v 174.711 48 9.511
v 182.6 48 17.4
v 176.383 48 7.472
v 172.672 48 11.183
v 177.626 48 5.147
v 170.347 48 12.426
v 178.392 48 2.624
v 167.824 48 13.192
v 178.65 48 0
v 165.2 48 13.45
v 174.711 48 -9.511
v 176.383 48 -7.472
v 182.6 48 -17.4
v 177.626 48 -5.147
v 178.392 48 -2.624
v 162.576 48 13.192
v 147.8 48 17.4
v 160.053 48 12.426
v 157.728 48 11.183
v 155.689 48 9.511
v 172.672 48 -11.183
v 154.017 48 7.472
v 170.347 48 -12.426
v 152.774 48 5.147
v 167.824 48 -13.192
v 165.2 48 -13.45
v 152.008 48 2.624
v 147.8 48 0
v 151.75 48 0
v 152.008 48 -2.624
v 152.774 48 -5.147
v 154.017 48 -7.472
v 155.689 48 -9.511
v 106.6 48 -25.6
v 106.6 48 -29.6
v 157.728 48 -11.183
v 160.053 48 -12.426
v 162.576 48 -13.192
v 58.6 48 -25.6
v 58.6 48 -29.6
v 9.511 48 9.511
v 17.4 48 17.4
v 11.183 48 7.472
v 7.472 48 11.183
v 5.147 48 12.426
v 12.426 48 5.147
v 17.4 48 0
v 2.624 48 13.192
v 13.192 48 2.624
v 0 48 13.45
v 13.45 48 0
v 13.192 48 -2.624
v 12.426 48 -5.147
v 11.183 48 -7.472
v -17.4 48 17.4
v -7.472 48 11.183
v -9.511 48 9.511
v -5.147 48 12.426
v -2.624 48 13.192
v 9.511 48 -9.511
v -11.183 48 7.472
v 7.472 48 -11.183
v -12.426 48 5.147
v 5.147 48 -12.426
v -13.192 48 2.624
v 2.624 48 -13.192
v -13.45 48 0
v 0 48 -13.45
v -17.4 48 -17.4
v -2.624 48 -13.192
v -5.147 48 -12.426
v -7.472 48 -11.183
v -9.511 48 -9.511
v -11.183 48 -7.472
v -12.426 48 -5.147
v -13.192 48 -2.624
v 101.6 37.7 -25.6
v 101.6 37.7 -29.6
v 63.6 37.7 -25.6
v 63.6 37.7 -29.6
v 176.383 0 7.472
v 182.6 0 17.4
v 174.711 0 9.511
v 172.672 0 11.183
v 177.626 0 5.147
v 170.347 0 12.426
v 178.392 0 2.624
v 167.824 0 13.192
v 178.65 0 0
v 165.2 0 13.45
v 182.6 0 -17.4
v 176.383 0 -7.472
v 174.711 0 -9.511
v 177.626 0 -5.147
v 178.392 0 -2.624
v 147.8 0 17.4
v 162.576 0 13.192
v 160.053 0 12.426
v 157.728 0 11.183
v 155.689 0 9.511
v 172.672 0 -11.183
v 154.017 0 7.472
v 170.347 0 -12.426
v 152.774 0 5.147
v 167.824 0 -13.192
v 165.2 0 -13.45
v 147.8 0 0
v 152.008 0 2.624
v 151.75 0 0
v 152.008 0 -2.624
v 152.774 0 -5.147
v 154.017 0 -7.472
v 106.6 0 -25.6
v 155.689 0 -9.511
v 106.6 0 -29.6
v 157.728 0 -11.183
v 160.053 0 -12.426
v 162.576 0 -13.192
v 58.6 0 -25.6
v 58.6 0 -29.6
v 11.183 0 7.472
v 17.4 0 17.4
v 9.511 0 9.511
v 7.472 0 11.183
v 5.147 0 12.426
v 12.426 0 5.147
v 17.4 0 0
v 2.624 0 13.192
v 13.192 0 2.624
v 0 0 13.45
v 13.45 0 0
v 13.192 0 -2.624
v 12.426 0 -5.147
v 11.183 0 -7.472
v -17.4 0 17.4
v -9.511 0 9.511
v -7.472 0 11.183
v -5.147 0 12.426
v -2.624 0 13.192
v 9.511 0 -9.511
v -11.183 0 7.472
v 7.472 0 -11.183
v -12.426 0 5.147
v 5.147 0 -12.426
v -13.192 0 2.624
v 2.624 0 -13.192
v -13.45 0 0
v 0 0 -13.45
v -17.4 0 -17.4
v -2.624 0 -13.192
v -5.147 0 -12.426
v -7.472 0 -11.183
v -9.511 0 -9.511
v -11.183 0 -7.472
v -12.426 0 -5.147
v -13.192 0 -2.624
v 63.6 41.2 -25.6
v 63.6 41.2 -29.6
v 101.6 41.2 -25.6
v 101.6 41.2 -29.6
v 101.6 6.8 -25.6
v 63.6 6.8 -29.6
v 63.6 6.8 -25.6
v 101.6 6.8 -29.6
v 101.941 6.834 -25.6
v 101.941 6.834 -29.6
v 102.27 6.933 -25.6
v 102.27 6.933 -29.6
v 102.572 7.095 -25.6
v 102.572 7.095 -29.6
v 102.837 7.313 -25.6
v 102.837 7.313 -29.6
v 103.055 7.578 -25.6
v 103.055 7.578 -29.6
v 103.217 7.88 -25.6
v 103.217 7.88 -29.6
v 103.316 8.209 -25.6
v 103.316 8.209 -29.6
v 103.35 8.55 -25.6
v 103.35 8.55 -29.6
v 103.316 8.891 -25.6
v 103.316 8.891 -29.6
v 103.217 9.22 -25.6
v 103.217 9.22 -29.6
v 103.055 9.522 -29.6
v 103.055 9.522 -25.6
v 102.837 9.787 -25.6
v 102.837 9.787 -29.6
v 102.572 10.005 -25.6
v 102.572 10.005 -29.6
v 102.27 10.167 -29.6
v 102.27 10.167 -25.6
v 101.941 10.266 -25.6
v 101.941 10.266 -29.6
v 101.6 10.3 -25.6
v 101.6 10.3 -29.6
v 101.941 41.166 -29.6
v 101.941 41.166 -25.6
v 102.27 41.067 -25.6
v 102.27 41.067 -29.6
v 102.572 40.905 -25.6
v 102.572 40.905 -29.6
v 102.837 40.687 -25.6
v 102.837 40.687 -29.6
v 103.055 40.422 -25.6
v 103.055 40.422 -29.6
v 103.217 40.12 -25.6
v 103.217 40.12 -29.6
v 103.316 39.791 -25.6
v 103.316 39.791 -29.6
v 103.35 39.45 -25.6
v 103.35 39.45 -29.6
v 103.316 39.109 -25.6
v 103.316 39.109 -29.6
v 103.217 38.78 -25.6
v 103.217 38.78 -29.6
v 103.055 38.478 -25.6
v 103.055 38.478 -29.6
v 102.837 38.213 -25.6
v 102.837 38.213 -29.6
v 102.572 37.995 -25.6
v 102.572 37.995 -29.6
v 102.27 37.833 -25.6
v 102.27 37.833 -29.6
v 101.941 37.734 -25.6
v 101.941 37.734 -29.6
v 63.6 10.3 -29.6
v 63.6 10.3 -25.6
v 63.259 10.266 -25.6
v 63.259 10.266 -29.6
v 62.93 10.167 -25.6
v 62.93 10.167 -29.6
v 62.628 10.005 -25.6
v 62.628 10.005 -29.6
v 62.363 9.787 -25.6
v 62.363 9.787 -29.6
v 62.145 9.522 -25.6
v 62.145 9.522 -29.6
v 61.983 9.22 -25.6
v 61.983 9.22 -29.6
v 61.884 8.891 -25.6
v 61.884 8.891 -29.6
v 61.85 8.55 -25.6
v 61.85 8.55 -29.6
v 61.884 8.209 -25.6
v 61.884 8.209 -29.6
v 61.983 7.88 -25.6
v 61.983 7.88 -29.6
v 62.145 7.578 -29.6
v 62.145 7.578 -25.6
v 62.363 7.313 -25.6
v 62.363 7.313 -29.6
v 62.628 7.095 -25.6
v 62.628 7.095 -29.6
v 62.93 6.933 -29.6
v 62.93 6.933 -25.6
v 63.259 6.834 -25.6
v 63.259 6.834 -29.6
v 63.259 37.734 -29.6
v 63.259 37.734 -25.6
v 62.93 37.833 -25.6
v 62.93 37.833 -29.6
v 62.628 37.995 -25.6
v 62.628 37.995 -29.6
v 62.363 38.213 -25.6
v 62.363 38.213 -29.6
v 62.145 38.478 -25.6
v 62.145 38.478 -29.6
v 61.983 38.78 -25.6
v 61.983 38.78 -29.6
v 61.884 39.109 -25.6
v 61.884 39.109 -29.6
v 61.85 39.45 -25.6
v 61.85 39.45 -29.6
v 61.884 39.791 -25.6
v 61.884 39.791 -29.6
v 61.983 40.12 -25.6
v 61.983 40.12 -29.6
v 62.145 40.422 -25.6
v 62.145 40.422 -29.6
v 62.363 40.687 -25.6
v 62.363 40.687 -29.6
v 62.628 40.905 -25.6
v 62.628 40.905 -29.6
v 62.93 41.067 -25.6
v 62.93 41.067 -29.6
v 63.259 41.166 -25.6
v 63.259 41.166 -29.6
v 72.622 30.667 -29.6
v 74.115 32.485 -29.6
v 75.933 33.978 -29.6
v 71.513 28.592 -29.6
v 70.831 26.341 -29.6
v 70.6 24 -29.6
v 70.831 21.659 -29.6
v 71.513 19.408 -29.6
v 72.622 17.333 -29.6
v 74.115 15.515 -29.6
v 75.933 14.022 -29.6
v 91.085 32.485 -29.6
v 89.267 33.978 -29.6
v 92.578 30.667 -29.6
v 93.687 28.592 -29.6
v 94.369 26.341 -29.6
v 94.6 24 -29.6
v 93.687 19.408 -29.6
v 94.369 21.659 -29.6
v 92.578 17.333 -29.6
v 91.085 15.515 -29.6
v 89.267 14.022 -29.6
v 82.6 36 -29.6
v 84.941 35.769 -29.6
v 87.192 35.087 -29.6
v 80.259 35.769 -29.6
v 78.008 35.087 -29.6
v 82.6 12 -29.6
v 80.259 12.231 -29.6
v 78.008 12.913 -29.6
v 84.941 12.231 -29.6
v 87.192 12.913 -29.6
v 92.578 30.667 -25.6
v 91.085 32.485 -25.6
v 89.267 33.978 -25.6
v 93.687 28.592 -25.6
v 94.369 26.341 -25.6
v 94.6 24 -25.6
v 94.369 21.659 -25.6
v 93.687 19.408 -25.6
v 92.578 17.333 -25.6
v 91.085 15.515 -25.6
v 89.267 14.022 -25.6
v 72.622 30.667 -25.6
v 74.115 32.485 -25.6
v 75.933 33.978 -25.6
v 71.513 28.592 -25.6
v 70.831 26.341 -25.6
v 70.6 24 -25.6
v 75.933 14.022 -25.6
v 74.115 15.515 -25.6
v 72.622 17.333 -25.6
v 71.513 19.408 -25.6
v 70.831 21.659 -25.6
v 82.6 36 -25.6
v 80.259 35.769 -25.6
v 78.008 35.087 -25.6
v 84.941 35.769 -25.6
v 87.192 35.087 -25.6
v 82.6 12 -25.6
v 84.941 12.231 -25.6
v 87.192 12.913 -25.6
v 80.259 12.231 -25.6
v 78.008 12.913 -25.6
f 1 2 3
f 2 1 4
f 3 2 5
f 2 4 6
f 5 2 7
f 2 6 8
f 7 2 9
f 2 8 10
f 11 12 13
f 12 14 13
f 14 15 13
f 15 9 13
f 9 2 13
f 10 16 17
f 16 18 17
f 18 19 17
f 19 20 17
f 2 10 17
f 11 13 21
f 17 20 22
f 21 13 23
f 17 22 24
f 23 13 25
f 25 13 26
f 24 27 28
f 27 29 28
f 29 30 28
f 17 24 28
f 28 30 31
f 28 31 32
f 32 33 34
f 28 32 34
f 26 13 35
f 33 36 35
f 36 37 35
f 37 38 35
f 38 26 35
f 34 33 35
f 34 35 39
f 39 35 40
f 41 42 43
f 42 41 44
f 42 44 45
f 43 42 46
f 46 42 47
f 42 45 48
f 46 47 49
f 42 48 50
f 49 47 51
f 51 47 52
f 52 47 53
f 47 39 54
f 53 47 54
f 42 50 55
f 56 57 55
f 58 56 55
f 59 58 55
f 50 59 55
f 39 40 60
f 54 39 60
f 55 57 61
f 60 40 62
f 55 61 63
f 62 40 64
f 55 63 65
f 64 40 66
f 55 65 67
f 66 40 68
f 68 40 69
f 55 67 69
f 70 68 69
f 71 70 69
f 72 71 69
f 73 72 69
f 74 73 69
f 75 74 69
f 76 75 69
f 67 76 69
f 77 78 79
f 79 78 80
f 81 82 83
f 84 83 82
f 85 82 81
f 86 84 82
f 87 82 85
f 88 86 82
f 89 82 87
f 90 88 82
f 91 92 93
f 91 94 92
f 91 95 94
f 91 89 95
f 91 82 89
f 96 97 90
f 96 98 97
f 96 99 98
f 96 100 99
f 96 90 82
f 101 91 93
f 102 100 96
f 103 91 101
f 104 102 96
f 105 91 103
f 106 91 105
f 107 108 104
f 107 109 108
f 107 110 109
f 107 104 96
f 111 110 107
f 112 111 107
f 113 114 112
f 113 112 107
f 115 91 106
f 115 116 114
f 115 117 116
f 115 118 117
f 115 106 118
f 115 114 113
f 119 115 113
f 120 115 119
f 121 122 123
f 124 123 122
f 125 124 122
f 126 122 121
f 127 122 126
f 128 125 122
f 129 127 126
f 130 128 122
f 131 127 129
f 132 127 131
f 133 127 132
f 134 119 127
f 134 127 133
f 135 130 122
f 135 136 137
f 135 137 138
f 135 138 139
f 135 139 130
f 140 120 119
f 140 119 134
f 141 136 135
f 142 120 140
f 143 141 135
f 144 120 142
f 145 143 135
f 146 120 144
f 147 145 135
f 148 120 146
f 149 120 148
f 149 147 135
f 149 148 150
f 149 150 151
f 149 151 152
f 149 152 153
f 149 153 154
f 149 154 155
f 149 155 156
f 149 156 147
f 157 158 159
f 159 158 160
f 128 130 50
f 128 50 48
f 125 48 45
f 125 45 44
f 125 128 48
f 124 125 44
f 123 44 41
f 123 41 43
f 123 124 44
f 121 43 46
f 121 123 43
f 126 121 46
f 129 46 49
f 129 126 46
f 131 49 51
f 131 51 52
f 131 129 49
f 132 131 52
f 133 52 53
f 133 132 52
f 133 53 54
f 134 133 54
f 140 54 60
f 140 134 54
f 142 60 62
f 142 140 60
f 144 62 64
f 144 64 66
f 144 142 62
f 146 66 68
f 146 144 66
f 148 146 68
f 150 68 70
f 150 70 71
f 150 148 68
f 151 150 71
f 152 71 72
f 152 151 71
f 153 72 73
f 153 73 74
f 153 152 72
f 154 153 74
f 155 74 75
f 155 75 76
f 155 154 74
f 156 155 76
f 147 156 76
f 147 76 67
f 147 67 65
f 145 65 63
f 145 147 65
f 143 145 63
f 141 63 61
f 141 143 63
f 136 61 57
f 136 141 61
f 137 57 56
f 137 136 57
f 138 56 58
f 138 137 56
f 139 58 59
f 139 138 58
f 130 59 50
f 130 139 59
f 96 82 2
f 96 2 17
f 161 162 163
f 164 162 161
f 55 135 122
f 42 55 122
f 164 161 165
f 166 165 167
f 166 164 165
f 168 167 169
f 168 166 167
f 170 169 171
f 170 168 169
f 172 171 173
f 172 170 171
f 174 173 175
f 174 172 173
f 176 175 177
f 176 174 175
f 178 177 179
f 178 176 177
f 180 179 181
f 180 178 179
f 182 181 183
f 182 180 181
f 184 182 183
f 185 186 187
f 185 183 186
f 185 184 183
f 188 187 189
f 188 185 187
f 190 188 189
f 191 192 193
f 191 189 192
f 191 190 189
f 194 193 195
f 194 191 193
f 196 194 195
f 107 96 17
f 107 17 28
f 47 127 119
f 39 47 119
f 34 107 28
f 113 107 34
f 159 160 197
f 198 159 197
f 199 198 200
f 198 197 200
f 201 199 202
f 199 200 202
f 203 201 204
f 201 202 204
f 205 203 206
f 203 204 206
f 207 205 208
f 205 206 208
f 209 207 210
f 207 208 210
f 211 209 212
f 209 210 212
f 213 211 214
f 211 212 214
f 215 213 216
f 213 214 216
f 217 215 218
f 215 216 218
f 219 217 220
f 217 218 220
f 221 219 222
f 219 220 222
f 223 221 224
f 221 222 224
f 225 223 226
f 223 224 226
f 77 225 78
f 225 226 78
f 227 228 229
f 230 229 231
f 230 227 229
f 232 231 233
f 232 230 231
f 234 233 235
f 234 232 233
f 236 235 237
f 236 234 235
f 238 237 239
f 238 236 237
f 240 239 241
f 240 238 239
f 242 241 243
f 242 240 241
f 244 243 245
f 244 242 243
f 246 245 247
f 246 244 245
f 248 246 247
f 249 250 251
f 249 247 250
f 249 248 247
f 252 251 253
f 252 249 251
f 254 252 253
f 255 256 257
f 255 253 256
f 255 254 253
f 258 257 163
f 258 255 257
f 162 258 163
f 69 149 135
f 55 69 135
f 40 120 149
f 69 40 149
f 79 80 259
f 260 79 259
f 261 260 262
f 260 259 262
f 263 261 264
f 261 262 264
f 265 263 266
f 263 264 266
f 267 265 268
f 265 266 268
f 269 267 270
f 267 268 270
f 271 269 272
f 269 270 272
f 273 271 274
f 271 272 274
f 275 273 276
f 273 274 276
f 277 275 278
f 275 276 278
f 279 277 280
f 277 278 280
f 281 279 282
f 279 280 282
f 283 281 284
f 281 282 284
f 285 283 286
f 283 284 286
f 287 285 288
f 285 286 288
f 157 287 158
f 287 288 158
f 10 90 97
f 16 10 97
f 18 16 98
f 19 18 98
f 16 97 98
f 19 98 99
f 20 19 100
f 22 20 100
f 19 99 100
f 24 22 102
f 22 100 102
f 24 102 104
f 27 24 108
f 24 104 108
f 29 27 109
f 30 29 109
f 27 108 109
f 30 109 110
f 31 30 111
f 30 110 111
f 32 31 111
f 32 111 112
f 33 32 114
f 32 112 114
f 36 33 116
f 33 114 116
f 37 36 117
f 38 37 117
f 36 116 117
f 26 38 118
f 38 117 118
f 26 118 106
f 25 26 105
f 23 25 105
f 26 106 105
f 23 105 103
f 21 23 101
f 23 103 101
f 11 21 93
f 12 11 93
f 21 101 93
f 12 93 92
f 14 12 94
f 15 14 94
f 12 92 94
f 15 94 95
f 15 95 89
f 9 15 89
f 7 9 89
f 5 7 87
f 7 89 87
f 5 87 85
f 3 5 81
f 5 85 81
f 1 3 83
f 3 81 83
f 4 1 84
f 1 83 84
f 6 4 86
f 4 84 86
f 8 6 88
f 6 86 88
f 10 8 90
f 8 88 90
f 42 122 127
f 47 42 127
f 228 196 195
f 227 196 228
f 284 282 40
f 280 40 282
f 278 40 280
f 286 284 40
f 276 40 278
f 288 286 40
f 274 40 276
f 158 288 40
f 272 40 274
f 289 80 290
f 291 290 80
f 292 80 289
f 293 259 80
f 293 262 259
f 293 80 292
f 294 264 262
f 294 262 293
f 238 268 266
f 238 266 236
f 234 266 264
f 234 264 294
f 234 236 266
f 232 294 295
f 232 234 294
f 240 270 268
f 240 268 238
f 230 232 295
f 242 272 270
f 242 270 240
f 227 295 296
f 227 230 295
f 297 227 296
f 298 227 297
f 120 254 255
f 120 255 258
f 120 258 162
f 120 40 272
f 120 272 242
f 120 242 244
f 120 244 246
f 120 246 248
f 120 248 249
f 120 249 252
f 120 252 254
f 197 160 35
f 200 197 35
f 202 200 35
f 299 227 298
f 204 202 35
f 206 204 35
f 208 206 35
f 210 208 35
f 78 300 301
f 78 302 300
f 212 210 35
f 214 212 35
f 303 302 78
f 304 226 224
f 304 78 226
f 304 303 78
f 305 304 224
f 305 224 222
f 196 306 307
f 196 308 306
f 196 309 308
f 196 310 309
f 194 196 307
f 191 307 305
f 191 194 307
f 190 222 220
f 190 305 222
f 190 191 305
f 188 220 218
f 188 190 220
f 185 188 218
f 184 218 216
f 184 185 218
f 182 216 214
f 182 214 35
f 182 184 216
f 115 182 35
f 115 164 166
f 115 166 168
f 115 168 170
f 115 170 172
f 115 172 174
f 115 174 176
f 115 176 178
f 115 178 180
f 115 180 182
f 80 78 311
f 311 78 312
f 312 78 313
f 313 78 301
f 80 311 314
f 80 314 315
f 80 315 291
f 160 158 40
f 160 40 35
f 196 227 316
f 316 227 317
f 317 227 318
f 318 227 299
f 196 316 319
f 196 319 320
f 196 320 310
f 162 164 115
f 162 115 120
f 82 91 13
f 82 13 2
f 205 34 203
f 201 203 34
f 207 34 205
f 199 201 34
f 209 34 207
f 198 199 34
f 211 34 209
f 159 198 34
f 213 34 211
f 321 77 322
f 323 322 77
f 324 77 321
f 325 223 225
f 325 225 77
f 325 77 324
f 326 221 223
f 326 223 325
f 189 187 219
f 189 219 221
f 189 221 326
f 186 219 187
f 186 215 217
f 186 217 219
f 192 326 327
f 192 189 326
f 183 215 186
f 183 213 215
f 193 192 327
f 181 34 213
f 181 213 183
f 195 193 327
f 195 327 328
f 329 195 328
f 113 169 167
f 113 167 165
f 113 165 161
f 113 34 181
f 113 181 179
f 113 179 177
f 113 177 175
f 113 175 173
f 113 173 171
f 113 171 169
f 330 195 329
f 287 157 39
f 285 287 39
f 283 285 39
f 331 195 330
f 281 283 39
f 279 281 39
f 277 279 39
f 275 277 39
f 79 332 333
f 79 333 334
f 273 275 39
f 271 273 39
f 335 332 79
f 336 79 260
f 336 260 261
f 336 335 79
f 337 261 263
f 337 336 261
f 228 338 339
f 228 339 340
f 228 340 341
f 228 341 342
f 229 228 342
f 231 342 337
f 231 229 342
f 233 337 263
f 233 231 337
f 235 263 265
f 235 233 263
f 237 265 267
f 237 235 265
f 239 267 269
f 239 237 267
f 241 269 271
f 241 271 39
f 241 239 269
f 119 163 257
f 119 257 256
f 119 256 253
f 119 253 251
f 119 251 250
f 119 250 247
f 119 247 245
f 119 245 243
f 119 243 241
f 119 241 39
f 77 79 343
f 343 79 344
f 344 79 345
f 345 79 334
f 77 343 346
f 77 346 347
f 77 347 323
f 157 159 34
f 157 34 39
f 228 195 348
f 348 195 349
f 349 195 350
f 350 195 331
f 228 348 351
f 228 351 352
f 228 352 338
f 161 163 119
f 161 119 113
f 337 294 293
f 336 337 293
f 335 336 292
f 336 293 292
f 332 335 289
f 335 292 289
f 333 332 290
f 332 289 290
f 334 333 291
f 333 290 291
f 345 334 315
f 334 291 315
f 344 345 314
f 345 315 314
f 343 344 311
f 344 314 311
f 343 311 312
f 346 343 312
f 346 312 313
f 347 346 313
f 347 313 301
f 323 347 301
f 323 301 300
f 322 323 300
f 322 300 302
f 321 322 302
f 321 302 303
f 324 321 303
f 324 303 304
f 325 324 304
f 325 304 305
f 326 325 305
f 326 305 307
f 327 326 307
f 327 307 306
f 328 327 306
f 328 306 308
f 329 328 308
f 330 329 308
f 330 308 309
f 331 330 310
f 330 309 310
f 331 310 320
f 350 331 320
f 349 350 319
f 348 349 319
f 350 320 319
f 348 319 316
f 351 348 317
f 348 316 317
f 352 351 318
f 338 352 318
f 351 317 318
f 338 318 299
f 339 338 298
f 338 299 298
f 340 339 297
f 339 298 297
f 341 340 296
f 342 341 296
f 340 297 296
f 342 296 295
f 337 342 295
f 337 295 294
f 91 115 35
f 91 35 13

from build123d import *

# Parameters (mm, degrees)
SKETCH2_R           = 13.45
BOSS_EXTRUDE1_DEPTH = 48
SKETCH4_R           = 12
CUT_EXTRUDE1_DEPTH  = 48


with BuildPart() as part:
    # Sketch2 → Boss-Extrude1 (new body)
    with BuildSketch(Plane(origin=(0, 0, 0), x_dir=(1, 0, 0), z_dir=(0, 1, 0))):
        Polygon((-17.4, -17.4), (17.4, -17.4), (17.4, 0), (58.6, 25.6), (82.6, 25.6), (82.6, 29.6), (58.6, 29.6), (-17.4, 17.4), align=None)
        with Locations(Location((0, 0, 0), (0, 0, 270))):
            Circle(SKETCH2_R, mode=Mode.SUBTRACT)
    boss_extrude1 = extrude(amount=BOSS_EXTRUDE1_DEPTH)

    # Mirror1: Boss-Extrude1 across plane
    add(boss_extrude1.mirror(Plane(origin=(82.6, 0, 0), x_dir=(0, 0, 1), z_dir=(1, 0, 0))))

    # Sketch4 → Cut-Extrude1 (cut)
    with BuildSketch(Plane(origin=(0, 0, -29.6), x_dir=(-1, 0, 0), z_dir=(0, 0, -1))):
        with Locations((-82.6, 24)):
            Circle(SKETCH4_R)
        with BuildLine():
            Line((-101.6, 10.3), (-63.6, 10.3))
            ThreePointArc((-63.6, 10.3), (-61.85, 8.55), (-63.6, 6.8))
            Line((-63.6, 6.8), (-101.6, 6.8))
            ThreePointArc((-101.6, 6.8), (-103.35, 8.55), (-101.6, 10.3))
        make_face()
        with BuildLine():
            Line((-101.6, 37.7), (-63.6, 37.7))
            ThreePointArc((-63.6, 37.7), (-61.85, 39.45), (-63.6, 41.2))
            Line((-63.6, 41.2), (-101.6, 41.2))
            ThreePointArc((-101.6, 41.2), (-103.35, 39.45), (-101.6, 37.7))
        make_face()
    extrude(amount=-CUT_EXTRUDE1_DEPTH, mode=Mode.SUBTRACT)


solid = part.part
